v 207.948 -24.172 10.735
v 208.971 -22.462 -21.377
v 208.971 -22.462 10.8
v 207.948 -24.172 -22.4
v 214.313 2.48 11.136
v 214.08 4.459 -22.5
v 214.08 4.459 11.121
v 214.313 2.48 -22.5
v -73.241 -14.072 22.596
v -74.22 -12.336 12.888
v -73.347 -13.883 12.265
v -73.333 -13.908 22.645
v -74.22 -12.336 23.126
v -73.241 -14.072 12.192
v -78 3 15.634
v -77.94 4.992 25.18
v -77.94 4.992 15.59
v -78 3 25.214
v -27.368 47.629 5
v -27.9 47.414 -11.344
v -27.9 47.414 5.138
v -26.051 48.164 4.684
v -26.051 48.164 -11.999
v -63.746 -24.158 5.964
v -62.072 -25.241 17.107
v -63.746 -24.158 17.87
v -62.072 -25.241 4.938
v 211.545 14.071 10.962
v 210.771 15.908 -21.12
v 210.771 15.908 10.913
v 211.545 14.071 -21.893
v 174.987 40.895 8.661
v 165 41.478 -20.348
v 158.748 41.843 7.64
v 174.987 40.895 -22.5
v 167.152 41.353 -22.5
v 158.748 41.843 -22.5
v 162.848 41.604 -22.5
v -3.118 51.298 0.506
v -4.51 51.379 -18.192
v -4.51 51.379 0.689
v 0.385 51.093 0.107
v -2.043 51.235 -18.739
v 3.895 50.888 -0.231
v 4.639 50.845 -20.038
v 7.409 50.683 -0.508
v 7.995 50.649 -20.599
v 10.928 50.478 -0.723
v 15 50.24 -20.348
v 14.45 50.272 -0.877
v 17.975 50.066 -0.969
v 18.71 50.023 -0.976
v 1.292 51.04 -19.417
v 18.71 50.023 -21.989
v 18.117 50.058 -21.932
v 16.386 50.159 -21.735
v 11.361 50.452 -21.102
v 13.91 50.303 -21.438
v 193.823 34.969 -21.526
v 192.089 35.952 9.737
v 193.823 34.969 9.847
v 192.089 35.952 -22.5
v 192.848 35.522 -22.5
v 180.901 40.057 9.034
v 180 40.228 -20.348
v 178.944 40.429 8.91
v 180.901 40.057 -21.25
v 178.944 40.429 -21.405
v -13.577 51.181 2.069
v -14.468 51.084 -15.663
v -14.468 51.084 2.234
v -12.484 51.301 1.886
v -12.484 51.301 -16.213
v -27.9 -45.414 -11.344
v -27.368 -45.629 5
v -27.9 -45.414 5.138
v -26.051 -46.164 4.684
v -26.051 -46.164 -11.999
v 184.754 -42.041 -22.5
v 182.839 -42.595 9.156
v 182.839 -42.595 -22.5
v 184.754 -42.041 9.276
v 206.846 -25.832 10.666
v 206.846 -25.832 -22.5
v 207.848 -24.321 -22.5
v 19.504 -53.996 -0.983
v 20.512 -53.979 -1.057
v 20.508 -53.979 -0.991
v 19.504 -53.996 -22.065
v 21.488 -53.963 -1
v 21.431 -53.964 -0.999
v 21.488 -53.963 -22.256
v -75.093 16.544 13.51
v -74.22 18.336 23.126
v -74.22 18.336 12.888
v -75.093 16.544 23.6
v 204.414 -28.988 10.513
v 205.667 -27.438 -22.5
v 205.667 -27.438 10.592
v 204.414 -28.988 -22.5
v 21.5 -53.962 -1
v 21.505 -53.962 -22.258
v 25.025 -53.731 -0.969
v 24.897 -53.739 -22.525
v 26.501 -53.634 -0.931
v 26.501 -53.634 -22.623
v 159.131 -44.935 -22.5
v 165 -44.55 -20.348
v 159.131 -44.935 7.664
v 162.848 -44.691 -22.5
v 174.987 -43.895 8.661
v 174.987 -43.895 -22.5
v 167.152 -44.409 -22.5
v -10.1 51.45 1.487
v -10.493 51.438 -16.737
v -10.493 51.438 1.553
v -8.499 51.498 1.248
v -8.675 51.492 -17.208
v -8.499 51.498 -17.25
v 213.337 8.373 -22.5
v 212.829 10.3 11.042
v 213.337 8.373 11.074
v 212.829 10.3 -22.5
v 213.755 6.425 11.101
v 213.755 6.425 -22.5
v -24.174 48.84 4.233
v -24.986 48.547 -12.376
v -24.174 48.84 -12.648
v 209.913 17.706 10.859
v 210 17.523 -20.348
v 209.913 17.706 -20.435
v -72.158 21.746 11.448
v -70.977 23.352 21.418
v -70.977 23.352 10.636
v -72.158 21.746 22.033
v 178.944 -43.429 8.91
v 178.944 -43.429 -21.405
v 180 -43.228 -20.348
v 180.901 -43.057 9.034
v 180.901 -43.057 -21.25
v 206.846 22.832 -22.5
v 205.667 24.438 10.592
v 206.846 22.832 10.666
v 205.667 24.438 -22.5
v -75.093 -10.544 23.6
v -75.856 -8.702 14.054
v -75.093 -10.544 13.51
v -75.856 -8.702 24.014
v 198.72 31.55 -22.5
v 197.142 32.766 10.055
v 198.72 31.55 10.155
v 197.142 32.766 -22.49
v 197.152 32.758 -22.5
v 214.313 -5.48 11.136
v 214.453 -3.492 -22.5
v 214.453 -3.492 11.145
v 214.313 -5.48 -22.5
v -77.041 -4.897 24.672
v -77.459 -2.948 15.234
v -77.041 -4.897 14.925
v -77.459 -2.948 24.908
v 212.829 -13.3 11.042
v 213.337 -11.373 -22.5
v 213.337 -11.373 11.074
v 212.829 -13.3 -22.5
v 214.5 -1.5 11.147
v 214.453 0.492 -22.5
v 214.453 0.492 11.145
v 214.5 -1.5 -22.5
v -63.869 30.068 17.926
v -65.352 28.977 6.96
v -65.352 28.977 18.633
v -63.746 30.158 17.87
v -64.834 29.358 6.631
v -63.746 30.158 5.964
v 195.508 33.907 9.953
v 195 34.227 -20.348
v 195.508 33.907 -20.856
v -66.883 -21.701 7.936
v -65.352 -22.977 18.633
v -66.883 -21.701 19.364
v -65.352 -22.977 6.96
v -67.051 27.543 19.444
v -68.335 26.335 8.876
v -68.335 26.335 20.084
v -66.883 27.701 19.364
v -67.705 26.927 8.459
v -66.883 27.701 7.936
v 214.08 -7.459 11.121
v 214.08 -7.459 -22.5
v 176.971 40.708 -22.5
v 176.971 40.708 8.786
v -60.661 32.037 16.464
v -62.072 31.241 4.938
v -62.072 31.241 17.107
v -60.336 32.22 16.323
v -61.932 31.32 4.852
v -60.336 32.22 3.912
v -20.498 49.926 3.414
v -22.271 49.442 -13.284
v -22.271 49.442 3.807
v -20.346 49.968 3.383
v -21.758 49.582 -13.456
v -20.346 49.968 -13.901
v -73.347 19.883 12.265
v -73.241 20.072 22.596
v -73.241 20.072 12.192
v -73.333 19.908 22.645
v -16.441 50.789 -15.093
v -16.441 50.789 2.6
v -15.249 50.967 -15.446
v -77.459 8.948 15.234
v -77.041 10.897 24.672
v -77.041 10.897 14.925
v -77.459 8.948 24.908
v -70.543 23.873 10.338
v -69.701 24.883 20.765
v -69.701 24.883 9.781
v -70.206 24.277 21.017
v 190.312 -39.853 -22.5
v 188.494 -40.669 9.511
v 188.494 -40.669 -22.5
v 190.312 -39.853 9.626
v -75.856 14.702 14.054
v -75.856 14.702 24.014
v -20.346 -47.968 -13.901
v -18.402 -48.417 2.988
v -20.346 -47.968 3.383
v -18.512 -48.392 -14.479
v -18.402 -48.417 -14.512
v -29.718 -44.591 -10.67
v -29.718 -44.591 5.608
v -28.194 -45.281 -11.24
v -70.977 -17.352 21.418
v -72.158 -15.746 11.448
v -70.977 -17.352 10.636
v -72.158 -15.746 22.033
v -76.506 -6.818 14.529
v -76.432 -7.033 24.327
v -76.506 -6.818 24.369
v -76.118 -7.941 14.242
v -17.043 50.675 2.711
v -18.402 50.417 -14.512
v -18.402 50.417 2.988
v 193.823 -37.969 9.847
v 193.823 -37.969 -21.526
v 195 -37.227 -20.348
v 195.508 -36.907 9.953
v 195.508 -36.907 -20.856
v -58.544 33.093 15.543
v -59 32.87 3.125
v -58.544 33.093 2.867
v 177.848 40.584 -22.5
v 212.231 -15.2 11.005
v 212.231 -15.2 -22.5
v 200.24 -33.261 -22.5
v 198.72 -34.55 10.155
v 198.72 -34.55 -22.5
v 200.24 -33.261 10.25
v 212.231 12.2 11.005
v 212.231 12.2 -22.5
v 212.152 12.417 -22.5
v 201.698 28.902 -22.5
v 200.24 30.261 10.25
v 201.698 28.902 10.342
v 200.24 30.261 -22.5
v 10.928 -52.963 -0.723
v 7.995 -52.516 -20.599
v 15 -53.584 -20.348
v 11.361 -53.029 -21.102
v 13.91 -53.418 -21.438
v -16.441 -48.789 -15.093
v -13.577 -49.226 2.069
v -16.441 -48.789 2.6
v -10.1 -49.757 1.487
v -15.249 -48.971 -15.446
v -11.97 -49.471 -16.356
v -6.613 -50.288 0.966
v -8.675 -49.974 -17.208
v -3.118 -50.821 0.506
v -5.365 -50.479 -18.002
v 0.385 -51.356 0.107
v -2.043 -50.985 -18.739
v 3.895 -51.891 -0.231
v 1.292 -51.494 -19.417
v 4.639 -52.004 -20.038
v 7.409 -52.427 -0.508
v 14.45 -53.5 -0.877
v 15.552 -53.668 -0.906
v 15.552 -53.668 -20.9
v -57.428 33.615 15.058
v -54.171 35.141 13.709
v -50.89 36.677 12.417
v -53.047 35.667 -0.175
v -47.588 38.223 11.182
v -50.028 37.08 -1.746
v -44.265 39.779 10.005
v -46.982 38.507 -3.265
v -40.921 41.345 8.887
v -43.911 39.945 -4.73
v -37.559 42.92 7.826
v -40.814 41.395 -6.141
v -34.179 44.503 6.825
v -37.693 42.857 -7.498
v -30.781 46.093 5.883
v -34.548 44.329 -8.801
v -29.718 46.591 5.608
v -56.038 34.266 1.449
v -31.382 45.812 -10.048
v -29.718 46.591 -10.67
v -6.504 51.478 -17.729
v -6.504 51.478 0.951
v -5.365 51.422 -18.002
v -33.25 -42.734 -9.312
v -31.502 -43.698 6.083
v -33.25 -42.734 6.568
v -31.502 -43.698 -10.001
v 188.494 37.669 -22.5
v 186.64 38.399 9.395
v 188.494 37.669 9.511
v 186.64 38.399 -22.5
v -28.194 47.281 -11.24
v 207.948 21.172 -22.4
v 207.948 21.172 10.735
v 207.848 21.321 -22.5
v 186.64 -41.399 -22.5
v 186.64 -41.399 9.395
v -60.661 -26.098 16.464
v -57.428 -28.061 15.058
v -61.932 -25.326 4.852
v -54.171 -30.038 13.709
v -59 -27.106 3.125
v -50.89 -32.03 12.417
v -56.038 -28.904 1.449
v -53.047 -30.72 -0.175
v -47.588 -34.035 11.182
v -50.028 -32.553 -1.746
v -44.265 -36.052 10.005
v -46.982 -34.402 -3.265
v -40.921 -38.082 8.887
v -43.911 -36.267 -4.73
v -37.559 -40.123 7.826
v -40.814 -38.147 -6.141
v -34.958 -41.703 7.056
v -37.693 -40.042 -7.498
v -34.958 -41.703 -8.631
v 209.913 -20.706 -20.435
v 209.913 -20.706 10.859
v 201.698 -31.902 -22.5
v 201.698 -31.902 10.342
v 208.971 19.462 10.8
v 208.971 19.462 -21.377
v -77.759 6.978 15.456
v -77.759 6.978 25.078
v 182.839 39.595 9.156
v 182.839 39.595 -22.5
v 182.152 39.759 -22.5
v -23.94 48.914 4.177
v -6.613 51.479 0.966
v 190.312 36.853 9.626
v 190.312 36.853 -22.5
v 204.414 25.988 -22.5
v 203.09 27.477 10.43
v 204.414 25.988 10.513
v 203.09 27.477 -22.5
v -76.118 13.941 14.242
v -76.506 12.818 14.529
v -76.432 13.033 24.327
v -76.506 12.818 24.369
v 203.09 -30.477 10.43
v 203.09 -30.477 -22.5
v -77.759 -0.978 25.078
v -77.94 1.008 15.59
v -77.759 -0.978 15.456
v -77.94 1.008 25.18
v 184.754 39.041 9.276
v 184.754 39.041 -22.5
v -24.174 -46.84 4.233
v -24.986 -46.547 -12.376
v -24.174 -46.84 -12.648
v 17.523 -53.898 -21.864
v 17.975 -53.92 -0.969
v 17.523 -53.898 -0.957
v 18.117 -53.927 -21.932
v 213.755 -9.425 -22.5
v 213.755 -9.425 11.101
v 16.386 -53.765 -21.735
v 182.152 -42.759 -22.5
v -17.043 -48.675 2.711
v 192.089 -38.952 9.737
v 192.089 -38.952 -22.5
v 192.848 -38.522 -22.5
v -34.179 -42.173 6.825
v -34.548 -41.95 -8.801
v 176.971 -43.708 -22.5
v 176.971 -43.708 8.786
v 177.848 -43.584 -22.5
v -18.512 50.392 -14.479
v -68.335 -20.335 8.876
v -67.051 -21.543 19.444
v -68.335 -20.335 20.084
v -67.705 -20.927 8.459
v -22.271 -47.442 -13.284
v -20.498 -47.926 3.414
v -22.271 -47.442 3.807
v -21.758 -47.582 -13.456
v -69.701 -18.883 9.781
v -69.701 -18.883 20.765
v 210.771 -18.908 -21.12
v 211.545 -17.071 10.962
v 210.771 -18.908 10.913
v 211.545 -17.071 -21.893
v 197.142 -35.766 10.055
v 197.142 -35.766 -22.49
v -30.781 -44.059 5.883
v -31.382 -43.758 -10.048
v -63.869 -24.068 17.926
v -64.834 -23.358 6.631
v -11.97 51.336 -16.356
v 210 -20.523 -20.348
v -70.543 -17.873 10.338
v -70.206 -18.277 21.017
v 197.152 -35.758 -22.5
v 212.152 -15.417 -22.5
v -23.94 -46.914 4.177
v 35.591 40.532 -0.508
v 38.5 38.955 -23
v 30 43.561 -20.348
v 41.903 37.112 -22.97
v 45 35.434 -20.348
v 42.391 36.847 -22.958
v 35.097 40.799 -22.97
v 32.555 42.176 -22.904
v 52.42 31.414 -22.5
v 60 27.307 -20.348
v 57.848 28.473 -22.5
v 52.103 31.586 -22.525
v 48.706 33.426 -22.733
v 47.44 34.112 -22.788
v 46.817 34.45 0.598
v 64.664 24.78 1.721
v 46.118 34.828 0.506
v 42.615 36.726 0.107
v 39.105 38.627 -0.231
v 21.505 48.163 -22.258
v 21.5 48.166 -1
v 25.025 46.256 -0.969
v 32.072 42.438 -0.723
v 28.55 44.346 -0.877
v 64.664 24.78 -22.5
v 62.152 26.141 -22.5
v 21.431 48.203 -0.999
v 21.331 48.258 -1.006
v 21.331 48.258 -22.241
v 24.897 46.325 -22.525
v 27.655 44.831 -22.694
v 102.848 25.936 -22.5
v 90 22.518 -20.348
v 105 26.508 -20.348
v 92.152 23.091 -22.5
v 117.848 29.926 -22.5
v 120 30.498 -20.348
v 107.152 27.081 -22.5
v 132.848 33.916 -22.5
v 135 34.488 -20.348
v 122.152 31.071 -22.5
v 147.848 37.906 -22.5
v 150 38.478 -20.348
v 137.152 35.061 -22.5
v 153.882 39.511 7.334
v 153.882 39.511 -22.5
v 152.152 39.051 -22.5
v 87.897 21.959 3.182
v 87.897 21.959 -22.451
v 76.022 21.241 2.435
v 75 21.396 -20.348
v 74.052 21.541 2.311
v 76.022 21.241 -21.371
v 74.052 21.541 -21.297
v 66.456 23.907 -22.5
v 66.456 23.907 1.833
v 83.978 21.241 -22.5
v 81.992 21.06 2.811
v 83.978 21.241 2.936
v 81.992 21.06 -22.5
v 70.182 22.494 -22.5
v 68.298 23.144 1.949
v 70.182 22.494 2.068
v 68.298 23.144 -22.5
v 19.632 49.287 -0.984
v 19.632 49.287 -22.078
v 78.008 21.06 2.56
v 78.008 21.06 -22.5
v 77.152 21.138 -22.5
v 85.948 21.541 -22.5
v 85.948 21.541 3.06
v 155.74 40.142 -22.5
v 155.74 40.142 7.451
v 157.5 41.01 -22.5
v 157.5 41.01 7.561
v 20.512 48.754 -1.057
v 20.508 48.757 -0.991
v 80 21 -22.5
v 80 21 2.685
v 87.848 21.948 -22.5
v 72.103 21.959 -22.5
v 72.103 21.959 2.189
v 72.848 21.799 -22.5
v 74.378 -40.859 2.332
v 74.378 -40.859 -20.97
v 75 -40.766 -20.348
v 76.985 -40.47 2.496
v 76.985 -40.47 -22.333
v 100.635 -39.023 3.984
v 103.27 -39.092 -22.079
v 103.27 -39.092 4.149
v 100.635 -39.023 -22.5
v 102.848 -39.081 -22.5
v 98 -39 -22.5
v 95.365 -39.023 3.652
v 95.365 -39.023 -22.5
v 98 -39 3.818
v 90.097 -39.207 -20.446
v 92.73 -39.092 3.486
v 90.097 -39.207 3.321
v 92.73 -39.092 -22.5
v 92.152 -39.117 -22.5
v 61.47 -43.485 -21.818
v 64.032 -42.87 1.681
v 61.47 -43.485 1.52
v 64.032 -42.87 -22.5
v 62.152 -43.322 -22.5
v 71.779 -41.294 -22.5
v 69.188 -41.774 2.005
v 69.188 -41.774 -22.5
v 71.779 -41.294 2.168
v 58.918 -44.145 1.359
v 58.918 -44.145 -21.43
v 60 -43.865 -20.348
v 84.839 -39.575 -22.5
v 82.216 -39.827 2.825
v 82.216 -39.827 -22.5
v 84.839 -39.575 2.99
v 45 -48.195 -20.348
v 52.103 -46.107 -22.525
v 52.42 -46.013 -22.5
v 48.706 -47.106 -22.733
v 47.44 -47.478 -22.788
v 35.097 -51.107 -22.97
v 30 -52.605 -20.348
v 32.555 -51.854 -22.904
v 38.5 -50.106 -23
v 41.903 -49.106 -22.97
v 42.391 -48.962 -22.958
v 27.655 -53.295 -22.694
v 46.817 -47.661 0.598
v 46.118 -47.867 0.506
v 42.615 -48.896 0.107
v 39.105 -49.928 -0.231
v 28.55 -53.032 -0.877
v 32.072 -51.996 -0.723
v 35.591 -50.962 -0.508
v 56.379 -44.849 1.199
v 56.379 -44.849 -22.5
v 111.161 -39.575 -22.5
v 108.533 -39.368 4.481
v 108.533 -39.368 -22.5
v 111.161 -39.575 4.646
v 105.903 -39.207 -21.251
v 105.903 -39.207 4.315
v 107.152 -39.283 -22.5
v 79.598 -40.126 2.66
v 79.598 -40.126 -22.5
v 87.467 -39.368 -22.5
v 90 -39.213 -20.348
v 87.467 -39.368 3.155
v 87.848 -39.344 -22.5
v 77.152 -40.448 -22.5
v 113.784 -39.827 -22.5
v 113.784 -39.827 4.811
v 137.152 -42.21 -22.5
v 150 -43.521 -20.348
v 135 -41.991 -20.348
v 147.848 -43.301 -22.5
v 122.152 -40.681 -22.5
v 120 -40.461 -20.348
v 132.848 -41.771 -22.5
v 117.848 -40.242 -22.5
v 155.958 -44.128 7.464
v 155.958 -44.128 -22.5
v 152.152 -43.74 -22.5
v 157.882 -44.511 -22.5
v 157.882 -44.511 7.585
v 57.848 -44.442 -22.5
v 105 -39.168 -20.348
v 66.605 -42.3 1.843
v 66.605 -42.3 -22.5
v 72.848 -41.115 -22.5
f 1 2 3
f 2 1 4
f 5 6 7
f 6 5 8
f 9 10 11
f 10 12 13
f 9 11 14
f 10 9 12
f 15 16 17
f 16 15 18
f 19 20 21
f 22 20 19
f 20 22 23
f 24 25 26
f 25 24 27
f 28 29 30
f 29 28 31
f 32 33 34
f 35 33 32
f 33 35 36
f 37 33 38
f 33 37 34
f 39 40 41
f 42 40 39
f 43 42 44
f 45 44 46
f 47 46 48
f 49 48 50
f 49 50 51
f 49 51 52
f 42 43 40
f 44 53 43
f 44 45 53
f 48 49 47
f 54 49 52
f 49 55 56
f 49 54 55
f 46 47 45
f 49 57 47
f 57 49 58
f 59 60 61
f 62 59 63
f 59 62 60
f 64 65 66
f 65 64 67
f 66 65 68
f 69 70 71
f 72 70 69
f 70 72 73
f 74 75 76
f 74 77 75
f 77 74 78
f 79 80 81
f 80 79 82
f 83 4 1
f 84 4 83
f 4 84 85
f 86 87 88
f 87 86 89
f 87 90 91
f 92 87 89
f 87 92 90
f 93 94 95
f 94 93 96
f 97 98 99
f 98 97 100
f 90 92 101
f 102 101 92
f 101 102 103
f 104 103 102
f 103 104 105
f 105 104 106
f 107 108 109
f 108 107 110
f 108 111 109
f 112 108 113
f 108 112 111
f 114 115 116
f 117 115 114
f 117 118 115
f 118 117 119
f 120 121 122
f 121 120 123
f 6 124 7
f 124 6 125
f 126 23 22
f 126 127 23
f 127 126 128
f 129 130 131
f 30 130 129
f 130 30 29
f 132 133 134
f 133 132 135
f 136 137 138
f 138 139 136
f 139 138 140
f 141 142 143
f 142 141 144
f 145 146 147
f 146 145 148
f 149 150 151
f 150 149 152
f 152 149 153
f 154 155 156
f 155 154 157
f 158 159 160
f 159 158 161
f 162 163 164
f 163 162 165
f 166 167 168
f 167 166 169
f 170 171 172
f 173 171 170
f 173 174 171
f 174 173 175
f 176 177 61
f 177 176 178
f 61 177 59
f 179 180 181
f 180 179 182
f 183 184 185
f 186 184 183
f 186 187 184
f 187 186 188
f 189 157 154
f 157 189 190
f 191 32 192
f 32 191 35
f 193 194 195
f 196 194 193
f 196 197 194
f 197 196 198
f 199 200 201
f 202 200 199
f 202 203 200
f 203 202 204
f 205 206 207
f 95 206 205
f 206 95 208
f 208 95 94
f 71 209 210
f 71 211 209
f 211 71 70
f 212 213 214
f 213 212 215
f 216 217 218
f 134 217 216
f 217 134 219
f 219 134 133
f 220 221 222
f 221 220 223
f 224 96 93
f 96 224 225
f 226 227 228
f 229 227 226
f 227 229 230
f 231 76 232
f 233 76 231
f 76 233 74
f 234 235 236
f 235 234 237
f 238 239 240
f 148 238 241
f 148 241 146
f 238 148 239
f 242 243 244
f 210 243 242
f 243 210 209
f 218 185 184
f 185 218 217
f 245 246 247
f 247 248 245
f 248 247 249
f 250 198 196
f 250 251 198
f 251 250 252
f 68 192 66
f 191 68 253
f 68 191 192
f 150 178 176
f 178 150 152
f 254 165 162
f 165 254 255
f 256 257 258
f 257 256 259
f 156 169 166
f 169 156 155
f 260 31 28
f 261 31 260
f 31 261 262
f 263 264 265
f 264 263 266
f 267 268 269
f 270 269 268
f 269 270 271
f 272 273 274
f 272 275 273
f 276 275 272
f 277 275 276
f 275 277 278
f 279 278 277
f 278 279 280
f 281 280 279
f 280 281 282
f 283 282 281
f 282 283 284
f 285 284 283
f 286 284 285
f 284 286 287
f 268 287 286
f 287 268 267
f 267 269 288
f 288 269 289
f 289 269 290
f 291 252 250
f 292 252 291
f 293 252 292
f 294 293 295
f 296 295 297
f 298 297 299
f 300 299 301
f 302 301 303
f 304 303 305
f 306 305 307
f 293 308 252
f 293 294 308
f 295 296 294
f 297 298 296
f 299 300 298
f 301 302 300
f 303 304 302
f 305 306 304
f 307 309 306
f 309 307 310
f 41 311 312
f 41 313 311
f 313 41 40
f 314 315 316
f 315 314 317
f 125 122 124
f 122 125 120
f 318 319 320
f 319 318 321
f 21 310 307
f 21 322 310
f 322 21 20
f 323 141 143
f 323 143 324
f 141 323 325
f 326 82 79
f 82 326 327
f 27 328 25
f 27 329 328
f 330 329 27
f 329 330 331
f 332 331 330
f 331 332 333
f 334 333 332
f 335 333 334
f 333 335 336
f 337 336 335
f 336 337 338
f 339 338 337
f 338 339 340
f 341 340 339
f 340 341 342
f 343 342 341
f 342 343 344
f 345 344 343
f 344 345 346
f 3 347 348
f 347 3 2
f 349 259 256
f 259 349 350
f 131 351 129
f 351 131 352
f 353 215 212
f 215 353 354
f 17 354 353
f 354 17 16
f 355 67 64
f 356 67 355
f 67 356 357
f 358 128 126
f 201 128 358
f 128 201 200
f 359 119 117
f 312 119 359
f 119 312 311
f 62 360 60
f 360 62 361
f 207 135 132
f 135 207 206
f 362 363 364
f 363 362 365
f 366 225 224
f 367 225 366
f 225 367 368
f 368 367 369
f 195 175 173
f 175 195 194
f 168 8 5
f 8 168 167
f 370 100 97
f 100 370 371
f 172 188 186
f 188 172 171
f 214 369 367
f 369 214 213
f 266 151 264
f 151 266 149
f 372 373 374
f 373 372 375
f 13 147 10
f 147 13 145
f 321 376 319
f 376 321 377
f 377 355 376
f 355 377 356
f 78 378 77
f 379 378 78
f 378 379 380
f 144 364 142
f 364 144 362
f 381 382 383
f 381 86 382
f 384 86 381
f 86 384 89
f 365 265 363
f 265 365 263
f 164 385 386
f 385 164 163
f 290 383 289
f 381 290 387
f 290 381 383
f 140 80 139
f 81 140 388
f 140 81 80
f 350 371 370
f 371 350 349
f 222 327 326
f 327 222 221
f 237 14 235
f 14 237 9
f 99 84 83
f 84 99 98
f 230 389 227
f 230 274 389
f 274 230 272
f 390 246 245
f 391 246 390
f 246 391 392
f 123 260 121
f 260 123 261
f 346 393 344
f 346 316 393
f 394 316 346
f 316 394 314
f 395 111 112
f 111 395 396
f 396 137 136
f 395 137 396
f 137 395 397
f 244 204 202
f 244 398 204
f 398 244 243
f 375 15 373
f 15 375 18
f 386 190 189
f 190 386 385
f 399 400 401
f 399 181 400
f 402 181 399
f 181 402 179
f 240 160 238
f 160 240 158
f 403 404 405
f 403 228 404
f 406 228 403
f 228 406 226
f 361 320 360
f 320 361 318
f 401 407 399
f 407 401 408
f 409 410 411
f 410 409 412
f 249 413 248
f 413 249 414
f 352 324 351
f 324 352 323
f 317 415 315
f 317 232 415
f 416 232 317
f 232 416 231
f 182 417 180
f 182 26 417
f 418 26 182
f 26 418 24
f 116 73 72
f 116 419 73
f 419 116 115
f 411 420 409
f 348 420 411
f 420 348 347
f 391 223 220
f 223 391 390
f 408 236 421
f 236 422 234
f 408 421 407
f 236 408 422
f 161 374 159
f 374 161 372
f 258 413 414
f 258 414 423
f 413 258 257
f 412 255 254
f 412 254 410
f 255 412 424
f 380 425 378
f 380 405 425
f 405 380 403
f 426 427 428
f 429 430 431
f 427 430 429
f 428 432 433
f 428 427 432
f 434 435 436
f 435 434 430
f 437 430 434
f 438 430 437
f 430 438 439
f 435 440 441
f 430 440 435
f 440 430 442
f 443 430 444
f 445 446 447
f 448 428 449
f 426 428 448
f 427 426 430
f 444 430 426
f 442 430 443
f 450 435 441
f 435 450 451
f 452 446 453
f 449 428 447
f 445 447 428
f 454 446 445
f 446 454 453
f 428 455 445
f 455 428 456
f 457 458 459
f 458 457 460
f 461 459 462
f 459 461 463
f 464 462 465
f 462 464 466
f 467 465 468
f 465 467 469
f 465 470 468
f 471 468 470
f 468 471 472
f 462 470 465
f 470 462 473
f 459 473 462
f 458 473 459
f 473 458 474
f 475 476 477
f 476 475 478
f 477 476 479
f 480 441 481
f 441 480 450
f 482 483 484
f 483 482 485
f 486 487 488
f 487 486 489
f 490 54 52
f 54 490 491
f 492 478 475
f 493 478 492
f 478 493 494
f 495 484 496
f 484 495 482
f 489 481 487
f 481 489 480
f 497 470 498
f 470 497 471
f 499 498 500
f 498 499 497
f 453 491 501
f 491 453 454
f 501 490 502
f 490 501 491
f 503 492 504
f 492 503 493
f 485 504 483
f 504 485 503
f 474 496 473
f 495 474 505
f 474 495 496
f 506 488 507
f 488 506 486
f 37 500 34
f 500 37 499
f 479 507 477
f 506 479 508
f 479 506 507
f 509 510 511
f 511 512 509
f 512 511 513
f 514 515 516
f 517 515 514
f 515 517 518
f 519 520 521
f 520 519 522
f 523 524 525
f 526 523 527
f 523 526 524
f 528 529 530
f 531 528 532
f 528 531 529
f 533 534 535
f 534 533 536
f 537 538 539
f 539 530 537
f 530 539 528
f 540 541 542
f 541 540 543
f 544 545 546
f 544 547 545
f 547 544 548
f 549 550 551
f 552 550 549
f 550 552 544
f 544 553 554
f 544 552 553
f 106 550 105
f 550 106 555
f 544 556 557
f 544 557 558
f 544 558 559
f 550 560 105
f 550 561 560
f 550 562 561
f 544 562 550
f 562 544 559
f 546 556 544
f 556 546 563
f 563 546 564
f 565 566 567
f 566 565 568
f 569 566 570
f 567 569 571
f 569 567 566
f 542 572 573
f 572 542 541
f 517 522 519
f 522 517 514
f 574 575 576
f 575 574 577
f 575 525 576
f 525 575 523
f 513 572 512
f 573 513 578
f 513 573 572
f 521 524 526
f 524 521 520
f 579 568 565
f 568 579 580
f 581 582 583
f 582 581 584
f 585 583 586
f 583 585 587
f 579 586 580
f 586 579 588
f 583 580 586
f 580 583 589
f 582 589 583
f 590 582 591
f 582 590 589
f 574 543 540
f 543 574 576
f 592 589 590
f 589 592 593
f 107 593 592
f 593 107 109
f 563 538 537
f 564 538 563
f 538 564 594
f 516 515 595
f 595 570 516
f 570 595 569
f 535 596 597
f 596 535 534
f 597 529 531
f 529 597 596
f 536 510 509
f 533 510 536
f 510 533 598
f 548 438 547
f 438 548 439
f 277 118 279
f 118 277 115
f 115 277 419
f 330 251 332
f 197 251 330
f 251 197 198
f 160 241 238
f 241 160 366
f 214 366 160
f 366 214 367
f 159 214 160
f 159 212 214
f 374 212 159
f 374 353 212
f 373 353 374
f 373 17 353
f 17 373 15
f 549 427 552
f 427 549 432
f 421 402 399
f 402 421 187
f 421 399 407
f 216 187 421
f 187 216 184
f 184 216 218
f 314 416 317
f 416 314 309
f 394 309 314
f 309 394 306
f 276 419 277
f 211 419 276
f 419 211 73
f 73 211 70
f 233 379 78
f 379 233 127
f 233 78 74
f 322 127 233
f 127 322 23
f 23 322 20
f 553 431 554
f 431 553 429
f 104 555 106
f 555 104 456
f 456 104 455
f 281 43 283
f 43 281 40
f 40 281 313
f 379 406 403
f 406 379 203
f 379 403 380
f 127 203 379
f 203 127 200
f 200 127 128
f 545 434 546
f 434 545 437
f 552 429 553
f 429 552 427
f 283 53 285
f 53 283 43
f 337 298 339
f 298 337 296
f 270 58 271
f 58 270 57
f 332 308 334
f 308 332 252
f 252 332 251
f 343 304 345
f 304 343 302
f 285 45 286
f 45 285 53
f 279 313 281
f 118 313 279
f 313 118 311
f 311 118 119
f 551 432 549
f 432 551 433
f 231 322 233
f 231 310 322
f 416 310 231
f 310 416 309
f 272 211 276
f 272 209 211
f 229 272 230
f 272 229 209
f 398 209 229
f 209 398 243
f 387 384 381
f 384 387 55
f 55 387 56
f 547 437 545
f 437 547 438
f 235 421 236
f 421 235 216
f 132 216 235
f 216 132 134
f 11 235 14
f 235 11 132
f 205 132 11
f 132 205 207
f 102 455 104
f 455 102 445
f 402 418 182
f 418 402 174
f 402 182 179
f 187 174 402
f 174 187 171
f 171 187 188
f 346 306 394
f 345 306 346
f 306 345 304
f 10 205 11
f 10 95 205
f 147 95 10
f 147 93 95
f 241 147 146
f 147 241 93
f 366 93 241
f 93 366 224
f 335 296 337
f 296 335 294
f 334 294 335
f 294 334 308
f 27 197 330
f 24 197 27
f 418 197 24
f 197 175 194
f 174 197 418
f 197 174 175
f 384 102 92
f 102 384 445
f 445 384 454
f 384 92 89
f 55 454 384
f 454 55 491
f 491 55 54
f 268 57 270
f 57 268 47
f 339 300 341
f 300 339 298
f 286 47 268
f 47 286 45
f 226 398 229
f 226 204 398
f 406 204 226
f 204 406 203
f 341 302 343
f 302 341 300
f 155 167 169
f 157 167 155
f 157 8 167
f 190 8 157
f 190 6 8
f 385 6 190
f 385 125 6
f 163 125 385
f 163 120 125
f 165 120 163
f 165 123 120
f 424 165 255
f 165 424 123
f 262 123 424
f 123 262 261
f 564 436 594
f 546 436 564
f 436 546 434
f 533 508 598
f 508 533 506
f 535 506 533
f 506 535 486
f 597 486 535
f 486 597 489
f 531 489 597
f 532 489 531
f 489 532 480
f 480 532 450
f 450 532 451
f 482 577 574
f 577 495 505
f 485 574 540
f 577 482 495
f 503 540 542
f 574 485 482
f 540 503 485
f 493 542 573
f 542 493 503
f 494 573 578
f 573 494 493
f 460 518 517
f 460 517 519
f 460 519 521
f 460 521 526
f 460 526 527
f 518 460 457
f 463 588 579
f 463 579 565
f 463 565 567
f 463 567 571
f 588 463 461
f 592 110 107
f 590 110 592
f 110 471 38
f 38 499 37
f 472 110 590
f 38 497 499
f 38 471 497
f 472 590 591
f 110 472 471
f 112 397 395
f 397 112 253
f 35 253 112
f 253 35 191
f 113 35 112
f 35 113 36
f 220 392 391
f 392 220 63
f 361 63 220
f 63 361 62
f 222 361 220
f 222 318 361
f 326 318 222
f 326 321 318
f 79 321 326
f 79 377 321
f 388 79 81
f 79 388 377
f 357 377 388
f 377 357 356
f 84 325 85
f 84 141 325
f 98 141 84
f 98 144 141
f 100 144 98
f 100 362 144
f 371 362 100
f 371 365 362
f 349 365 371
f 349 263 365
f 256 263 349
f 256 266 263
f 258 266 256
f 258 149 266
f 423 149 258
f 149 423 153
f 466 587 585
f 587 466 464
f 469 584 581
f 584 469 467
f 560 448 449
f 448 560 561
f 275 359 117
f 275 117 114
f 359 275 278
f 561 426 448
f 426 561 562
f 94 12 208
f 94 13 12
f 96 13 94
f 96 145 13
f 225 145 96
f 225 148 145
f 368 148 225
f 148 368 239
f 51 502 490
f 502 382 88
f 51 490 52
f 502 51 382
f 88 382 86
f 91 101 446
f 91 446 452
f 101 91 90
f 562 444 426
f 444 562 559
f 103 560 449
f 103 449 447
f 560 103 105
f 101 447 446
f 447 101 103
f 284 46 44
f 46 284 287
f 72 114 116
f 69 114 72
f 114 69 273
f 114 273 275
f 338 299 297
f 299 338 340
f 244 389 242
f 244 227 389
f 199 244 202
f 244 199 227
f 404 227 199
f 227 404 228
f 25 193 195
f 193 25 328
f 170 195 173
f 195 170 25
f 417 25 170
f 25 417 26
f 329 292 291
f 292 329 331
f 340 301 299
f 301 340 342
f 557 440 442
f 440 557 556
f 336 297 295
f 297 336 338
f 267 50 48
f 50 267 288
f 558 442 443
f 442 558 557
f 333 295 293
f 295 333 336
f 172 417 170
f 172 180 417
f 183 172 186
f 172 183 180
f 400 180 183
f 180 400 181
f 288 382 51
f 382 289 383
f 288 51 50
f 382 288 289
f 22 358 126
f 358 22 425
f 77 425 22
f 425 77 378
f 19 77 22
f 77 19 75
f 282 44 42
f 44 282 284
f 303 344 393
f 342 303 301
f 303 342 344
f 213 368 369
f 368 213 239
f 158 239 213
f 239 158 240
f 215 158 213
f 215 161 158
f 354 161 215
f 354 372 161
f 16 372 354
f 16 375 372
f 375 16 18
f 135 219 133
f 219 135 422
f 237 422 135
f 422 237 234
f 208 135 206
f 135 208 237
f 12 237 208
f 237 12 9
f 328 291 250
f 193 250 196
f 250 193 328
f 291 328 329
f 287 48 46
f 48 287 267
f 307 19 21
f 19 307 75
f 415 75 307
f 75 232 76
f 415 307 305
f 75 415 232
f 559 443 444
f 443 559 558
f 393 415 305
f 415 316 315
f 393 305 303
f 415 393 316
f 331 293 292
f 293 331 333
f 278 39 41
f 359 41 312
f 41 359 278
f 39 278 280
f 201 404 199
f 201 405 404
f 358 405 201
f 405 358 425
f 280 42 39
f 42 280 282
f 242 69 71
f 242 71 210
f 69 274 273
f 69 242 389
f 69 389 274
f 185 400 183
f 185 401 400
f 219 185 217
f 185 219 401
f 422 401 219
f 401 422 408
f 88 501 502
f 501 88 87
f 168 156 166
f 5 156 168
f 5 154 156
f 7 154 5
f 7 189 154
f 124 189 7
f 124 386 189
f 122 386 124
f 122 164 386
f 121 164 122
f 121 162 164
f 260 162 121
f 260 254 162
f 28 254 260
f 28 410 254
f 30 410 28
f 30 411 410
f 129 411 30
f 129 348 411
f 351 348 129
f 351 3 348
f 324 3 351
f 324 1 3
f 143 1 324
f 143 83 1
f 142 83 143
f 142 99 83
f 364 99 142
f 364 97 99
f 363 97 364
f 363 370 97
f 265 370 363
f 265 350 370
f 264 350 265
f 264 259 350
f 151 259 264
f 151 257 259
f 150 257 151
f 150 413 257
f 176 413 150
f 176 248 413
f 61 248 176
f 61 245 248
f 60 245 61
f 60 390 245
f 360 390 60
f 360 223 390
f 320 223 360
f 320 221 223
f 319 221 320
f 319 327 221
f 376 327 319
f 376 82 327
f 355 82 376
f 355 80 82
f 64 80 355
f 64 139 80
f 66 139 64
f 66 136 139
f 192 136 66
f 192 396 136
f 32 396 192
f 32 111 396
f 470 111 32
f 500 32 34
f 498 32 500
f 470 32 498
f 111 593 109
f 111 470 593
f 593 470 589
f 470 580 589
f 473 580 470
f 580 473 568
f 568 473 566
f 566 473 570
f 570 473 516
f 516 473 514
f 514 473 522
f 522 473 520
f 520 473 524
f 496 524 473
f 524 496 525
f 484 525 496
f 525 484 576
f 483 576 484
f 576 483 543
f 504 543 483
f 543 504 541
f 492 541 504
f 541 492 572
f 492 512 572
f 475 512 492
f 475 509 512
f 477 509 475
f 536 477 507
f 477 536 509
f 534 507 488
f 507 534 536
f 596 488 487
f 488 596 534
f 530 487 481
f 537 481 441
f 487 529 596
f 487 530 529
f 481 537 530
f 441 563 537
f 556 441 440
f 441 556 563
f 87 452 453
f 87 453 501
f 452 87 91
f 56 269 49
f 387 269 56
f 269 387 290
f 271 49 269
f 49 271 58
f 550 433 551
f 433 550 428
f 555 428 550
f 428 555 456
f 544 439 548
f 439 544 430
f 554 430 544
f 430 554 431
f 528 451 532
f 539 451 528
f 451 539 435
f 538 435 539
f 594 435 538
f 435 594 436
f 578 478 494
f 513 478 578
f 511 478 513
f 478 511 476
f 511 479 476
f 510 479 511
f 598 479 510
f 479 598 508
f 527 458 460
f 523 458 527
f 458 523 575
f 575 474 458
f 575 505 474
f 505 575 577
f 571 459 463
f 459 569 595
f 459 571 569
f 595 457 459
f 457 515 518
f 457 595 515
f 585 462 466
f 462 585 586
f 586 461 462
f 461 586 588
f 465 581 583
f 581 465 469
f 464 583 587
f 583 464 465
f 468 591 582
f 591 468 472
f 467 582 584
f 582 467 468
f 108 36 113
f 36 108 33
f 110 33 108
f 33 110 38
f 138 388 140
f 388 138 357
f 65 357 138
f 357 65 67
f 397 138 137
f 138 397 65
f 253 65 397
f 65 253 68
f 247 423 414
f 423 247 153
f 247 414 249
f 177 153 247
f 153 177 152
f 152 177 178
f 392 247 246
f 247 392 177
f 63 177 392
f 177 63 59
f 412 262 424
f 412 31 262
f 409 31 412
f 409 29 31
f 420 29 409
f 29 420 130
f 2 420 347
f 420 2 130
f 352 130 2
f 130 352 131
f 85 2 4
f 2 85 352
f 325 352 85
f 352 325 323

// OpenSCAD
shape="soft";// [soft,mid,hard]
slit = 5; //[1:15]
COLOR="Orange"; // [Navy,Green,Orange,Gray]

color(COLOR)

difference(){ 
intersection() {
    difference() {
    linear_extrude(height = 60, center = true, convexity = 10)
hull(){
translate([-45,3,0])circle(33,$fa = 1);
translate([-8,1,0])circle(50.5,$fa = 1);
translate([20,-24,0])circle(30,$fa = 1);     
translate([172,-1.5,0])circle(42.5,$fa = 1);
}
linear_extrude(height = 65, center = true, convexity = 10)
hull(){
translate([28.5,62,0])circle(15.5,$fa = 1);
translate([80,54,0])circle(33,$fa = 1);
translate([150,54,0])circle(15,$fa = 1);
}

linear_extrude(height = 65, center = true, convexity = 10)
hull(){
translate([24,-70,0])circle(15,$fa = 1);
translate([98,-190,0])circle(151,$fa = 1);
translate([154,-59,0])circle(15,$fa = 1);
}
}

translate([-81.5,0,-20])    
difference(){
union() {
rotate([90,0,0])translate([120,192,0])cylinder(r=195,h=120,center=true,$fa=1);
rotate([90,0,0])translate([203,97.5,0]) cube([186,200,120],center=true);
}    
union() {
rotate([90,0,0])translate([103,221,0])cylinder(r=202,h=130,center=true,$fa=1);
rotate([90,-3.6,0])translate([203,112.5,0]) cube([200,200,130],center=true);
 rotate([90,0,0])translate([-26.5,62.5,0]) cube([60,60,130],center=true);
    rotate([90,0,0])translate([286.5,172.5,0]) cube([200,200,130],center=true);
}
}
}
for(i = [0: slit*3 :290])
    translate([i,0,-23]) 
    rotate(a=45, v=[0,1,0])
    scale(v=[1,200,1])
    cube(slit*0.75,center=true);
}
